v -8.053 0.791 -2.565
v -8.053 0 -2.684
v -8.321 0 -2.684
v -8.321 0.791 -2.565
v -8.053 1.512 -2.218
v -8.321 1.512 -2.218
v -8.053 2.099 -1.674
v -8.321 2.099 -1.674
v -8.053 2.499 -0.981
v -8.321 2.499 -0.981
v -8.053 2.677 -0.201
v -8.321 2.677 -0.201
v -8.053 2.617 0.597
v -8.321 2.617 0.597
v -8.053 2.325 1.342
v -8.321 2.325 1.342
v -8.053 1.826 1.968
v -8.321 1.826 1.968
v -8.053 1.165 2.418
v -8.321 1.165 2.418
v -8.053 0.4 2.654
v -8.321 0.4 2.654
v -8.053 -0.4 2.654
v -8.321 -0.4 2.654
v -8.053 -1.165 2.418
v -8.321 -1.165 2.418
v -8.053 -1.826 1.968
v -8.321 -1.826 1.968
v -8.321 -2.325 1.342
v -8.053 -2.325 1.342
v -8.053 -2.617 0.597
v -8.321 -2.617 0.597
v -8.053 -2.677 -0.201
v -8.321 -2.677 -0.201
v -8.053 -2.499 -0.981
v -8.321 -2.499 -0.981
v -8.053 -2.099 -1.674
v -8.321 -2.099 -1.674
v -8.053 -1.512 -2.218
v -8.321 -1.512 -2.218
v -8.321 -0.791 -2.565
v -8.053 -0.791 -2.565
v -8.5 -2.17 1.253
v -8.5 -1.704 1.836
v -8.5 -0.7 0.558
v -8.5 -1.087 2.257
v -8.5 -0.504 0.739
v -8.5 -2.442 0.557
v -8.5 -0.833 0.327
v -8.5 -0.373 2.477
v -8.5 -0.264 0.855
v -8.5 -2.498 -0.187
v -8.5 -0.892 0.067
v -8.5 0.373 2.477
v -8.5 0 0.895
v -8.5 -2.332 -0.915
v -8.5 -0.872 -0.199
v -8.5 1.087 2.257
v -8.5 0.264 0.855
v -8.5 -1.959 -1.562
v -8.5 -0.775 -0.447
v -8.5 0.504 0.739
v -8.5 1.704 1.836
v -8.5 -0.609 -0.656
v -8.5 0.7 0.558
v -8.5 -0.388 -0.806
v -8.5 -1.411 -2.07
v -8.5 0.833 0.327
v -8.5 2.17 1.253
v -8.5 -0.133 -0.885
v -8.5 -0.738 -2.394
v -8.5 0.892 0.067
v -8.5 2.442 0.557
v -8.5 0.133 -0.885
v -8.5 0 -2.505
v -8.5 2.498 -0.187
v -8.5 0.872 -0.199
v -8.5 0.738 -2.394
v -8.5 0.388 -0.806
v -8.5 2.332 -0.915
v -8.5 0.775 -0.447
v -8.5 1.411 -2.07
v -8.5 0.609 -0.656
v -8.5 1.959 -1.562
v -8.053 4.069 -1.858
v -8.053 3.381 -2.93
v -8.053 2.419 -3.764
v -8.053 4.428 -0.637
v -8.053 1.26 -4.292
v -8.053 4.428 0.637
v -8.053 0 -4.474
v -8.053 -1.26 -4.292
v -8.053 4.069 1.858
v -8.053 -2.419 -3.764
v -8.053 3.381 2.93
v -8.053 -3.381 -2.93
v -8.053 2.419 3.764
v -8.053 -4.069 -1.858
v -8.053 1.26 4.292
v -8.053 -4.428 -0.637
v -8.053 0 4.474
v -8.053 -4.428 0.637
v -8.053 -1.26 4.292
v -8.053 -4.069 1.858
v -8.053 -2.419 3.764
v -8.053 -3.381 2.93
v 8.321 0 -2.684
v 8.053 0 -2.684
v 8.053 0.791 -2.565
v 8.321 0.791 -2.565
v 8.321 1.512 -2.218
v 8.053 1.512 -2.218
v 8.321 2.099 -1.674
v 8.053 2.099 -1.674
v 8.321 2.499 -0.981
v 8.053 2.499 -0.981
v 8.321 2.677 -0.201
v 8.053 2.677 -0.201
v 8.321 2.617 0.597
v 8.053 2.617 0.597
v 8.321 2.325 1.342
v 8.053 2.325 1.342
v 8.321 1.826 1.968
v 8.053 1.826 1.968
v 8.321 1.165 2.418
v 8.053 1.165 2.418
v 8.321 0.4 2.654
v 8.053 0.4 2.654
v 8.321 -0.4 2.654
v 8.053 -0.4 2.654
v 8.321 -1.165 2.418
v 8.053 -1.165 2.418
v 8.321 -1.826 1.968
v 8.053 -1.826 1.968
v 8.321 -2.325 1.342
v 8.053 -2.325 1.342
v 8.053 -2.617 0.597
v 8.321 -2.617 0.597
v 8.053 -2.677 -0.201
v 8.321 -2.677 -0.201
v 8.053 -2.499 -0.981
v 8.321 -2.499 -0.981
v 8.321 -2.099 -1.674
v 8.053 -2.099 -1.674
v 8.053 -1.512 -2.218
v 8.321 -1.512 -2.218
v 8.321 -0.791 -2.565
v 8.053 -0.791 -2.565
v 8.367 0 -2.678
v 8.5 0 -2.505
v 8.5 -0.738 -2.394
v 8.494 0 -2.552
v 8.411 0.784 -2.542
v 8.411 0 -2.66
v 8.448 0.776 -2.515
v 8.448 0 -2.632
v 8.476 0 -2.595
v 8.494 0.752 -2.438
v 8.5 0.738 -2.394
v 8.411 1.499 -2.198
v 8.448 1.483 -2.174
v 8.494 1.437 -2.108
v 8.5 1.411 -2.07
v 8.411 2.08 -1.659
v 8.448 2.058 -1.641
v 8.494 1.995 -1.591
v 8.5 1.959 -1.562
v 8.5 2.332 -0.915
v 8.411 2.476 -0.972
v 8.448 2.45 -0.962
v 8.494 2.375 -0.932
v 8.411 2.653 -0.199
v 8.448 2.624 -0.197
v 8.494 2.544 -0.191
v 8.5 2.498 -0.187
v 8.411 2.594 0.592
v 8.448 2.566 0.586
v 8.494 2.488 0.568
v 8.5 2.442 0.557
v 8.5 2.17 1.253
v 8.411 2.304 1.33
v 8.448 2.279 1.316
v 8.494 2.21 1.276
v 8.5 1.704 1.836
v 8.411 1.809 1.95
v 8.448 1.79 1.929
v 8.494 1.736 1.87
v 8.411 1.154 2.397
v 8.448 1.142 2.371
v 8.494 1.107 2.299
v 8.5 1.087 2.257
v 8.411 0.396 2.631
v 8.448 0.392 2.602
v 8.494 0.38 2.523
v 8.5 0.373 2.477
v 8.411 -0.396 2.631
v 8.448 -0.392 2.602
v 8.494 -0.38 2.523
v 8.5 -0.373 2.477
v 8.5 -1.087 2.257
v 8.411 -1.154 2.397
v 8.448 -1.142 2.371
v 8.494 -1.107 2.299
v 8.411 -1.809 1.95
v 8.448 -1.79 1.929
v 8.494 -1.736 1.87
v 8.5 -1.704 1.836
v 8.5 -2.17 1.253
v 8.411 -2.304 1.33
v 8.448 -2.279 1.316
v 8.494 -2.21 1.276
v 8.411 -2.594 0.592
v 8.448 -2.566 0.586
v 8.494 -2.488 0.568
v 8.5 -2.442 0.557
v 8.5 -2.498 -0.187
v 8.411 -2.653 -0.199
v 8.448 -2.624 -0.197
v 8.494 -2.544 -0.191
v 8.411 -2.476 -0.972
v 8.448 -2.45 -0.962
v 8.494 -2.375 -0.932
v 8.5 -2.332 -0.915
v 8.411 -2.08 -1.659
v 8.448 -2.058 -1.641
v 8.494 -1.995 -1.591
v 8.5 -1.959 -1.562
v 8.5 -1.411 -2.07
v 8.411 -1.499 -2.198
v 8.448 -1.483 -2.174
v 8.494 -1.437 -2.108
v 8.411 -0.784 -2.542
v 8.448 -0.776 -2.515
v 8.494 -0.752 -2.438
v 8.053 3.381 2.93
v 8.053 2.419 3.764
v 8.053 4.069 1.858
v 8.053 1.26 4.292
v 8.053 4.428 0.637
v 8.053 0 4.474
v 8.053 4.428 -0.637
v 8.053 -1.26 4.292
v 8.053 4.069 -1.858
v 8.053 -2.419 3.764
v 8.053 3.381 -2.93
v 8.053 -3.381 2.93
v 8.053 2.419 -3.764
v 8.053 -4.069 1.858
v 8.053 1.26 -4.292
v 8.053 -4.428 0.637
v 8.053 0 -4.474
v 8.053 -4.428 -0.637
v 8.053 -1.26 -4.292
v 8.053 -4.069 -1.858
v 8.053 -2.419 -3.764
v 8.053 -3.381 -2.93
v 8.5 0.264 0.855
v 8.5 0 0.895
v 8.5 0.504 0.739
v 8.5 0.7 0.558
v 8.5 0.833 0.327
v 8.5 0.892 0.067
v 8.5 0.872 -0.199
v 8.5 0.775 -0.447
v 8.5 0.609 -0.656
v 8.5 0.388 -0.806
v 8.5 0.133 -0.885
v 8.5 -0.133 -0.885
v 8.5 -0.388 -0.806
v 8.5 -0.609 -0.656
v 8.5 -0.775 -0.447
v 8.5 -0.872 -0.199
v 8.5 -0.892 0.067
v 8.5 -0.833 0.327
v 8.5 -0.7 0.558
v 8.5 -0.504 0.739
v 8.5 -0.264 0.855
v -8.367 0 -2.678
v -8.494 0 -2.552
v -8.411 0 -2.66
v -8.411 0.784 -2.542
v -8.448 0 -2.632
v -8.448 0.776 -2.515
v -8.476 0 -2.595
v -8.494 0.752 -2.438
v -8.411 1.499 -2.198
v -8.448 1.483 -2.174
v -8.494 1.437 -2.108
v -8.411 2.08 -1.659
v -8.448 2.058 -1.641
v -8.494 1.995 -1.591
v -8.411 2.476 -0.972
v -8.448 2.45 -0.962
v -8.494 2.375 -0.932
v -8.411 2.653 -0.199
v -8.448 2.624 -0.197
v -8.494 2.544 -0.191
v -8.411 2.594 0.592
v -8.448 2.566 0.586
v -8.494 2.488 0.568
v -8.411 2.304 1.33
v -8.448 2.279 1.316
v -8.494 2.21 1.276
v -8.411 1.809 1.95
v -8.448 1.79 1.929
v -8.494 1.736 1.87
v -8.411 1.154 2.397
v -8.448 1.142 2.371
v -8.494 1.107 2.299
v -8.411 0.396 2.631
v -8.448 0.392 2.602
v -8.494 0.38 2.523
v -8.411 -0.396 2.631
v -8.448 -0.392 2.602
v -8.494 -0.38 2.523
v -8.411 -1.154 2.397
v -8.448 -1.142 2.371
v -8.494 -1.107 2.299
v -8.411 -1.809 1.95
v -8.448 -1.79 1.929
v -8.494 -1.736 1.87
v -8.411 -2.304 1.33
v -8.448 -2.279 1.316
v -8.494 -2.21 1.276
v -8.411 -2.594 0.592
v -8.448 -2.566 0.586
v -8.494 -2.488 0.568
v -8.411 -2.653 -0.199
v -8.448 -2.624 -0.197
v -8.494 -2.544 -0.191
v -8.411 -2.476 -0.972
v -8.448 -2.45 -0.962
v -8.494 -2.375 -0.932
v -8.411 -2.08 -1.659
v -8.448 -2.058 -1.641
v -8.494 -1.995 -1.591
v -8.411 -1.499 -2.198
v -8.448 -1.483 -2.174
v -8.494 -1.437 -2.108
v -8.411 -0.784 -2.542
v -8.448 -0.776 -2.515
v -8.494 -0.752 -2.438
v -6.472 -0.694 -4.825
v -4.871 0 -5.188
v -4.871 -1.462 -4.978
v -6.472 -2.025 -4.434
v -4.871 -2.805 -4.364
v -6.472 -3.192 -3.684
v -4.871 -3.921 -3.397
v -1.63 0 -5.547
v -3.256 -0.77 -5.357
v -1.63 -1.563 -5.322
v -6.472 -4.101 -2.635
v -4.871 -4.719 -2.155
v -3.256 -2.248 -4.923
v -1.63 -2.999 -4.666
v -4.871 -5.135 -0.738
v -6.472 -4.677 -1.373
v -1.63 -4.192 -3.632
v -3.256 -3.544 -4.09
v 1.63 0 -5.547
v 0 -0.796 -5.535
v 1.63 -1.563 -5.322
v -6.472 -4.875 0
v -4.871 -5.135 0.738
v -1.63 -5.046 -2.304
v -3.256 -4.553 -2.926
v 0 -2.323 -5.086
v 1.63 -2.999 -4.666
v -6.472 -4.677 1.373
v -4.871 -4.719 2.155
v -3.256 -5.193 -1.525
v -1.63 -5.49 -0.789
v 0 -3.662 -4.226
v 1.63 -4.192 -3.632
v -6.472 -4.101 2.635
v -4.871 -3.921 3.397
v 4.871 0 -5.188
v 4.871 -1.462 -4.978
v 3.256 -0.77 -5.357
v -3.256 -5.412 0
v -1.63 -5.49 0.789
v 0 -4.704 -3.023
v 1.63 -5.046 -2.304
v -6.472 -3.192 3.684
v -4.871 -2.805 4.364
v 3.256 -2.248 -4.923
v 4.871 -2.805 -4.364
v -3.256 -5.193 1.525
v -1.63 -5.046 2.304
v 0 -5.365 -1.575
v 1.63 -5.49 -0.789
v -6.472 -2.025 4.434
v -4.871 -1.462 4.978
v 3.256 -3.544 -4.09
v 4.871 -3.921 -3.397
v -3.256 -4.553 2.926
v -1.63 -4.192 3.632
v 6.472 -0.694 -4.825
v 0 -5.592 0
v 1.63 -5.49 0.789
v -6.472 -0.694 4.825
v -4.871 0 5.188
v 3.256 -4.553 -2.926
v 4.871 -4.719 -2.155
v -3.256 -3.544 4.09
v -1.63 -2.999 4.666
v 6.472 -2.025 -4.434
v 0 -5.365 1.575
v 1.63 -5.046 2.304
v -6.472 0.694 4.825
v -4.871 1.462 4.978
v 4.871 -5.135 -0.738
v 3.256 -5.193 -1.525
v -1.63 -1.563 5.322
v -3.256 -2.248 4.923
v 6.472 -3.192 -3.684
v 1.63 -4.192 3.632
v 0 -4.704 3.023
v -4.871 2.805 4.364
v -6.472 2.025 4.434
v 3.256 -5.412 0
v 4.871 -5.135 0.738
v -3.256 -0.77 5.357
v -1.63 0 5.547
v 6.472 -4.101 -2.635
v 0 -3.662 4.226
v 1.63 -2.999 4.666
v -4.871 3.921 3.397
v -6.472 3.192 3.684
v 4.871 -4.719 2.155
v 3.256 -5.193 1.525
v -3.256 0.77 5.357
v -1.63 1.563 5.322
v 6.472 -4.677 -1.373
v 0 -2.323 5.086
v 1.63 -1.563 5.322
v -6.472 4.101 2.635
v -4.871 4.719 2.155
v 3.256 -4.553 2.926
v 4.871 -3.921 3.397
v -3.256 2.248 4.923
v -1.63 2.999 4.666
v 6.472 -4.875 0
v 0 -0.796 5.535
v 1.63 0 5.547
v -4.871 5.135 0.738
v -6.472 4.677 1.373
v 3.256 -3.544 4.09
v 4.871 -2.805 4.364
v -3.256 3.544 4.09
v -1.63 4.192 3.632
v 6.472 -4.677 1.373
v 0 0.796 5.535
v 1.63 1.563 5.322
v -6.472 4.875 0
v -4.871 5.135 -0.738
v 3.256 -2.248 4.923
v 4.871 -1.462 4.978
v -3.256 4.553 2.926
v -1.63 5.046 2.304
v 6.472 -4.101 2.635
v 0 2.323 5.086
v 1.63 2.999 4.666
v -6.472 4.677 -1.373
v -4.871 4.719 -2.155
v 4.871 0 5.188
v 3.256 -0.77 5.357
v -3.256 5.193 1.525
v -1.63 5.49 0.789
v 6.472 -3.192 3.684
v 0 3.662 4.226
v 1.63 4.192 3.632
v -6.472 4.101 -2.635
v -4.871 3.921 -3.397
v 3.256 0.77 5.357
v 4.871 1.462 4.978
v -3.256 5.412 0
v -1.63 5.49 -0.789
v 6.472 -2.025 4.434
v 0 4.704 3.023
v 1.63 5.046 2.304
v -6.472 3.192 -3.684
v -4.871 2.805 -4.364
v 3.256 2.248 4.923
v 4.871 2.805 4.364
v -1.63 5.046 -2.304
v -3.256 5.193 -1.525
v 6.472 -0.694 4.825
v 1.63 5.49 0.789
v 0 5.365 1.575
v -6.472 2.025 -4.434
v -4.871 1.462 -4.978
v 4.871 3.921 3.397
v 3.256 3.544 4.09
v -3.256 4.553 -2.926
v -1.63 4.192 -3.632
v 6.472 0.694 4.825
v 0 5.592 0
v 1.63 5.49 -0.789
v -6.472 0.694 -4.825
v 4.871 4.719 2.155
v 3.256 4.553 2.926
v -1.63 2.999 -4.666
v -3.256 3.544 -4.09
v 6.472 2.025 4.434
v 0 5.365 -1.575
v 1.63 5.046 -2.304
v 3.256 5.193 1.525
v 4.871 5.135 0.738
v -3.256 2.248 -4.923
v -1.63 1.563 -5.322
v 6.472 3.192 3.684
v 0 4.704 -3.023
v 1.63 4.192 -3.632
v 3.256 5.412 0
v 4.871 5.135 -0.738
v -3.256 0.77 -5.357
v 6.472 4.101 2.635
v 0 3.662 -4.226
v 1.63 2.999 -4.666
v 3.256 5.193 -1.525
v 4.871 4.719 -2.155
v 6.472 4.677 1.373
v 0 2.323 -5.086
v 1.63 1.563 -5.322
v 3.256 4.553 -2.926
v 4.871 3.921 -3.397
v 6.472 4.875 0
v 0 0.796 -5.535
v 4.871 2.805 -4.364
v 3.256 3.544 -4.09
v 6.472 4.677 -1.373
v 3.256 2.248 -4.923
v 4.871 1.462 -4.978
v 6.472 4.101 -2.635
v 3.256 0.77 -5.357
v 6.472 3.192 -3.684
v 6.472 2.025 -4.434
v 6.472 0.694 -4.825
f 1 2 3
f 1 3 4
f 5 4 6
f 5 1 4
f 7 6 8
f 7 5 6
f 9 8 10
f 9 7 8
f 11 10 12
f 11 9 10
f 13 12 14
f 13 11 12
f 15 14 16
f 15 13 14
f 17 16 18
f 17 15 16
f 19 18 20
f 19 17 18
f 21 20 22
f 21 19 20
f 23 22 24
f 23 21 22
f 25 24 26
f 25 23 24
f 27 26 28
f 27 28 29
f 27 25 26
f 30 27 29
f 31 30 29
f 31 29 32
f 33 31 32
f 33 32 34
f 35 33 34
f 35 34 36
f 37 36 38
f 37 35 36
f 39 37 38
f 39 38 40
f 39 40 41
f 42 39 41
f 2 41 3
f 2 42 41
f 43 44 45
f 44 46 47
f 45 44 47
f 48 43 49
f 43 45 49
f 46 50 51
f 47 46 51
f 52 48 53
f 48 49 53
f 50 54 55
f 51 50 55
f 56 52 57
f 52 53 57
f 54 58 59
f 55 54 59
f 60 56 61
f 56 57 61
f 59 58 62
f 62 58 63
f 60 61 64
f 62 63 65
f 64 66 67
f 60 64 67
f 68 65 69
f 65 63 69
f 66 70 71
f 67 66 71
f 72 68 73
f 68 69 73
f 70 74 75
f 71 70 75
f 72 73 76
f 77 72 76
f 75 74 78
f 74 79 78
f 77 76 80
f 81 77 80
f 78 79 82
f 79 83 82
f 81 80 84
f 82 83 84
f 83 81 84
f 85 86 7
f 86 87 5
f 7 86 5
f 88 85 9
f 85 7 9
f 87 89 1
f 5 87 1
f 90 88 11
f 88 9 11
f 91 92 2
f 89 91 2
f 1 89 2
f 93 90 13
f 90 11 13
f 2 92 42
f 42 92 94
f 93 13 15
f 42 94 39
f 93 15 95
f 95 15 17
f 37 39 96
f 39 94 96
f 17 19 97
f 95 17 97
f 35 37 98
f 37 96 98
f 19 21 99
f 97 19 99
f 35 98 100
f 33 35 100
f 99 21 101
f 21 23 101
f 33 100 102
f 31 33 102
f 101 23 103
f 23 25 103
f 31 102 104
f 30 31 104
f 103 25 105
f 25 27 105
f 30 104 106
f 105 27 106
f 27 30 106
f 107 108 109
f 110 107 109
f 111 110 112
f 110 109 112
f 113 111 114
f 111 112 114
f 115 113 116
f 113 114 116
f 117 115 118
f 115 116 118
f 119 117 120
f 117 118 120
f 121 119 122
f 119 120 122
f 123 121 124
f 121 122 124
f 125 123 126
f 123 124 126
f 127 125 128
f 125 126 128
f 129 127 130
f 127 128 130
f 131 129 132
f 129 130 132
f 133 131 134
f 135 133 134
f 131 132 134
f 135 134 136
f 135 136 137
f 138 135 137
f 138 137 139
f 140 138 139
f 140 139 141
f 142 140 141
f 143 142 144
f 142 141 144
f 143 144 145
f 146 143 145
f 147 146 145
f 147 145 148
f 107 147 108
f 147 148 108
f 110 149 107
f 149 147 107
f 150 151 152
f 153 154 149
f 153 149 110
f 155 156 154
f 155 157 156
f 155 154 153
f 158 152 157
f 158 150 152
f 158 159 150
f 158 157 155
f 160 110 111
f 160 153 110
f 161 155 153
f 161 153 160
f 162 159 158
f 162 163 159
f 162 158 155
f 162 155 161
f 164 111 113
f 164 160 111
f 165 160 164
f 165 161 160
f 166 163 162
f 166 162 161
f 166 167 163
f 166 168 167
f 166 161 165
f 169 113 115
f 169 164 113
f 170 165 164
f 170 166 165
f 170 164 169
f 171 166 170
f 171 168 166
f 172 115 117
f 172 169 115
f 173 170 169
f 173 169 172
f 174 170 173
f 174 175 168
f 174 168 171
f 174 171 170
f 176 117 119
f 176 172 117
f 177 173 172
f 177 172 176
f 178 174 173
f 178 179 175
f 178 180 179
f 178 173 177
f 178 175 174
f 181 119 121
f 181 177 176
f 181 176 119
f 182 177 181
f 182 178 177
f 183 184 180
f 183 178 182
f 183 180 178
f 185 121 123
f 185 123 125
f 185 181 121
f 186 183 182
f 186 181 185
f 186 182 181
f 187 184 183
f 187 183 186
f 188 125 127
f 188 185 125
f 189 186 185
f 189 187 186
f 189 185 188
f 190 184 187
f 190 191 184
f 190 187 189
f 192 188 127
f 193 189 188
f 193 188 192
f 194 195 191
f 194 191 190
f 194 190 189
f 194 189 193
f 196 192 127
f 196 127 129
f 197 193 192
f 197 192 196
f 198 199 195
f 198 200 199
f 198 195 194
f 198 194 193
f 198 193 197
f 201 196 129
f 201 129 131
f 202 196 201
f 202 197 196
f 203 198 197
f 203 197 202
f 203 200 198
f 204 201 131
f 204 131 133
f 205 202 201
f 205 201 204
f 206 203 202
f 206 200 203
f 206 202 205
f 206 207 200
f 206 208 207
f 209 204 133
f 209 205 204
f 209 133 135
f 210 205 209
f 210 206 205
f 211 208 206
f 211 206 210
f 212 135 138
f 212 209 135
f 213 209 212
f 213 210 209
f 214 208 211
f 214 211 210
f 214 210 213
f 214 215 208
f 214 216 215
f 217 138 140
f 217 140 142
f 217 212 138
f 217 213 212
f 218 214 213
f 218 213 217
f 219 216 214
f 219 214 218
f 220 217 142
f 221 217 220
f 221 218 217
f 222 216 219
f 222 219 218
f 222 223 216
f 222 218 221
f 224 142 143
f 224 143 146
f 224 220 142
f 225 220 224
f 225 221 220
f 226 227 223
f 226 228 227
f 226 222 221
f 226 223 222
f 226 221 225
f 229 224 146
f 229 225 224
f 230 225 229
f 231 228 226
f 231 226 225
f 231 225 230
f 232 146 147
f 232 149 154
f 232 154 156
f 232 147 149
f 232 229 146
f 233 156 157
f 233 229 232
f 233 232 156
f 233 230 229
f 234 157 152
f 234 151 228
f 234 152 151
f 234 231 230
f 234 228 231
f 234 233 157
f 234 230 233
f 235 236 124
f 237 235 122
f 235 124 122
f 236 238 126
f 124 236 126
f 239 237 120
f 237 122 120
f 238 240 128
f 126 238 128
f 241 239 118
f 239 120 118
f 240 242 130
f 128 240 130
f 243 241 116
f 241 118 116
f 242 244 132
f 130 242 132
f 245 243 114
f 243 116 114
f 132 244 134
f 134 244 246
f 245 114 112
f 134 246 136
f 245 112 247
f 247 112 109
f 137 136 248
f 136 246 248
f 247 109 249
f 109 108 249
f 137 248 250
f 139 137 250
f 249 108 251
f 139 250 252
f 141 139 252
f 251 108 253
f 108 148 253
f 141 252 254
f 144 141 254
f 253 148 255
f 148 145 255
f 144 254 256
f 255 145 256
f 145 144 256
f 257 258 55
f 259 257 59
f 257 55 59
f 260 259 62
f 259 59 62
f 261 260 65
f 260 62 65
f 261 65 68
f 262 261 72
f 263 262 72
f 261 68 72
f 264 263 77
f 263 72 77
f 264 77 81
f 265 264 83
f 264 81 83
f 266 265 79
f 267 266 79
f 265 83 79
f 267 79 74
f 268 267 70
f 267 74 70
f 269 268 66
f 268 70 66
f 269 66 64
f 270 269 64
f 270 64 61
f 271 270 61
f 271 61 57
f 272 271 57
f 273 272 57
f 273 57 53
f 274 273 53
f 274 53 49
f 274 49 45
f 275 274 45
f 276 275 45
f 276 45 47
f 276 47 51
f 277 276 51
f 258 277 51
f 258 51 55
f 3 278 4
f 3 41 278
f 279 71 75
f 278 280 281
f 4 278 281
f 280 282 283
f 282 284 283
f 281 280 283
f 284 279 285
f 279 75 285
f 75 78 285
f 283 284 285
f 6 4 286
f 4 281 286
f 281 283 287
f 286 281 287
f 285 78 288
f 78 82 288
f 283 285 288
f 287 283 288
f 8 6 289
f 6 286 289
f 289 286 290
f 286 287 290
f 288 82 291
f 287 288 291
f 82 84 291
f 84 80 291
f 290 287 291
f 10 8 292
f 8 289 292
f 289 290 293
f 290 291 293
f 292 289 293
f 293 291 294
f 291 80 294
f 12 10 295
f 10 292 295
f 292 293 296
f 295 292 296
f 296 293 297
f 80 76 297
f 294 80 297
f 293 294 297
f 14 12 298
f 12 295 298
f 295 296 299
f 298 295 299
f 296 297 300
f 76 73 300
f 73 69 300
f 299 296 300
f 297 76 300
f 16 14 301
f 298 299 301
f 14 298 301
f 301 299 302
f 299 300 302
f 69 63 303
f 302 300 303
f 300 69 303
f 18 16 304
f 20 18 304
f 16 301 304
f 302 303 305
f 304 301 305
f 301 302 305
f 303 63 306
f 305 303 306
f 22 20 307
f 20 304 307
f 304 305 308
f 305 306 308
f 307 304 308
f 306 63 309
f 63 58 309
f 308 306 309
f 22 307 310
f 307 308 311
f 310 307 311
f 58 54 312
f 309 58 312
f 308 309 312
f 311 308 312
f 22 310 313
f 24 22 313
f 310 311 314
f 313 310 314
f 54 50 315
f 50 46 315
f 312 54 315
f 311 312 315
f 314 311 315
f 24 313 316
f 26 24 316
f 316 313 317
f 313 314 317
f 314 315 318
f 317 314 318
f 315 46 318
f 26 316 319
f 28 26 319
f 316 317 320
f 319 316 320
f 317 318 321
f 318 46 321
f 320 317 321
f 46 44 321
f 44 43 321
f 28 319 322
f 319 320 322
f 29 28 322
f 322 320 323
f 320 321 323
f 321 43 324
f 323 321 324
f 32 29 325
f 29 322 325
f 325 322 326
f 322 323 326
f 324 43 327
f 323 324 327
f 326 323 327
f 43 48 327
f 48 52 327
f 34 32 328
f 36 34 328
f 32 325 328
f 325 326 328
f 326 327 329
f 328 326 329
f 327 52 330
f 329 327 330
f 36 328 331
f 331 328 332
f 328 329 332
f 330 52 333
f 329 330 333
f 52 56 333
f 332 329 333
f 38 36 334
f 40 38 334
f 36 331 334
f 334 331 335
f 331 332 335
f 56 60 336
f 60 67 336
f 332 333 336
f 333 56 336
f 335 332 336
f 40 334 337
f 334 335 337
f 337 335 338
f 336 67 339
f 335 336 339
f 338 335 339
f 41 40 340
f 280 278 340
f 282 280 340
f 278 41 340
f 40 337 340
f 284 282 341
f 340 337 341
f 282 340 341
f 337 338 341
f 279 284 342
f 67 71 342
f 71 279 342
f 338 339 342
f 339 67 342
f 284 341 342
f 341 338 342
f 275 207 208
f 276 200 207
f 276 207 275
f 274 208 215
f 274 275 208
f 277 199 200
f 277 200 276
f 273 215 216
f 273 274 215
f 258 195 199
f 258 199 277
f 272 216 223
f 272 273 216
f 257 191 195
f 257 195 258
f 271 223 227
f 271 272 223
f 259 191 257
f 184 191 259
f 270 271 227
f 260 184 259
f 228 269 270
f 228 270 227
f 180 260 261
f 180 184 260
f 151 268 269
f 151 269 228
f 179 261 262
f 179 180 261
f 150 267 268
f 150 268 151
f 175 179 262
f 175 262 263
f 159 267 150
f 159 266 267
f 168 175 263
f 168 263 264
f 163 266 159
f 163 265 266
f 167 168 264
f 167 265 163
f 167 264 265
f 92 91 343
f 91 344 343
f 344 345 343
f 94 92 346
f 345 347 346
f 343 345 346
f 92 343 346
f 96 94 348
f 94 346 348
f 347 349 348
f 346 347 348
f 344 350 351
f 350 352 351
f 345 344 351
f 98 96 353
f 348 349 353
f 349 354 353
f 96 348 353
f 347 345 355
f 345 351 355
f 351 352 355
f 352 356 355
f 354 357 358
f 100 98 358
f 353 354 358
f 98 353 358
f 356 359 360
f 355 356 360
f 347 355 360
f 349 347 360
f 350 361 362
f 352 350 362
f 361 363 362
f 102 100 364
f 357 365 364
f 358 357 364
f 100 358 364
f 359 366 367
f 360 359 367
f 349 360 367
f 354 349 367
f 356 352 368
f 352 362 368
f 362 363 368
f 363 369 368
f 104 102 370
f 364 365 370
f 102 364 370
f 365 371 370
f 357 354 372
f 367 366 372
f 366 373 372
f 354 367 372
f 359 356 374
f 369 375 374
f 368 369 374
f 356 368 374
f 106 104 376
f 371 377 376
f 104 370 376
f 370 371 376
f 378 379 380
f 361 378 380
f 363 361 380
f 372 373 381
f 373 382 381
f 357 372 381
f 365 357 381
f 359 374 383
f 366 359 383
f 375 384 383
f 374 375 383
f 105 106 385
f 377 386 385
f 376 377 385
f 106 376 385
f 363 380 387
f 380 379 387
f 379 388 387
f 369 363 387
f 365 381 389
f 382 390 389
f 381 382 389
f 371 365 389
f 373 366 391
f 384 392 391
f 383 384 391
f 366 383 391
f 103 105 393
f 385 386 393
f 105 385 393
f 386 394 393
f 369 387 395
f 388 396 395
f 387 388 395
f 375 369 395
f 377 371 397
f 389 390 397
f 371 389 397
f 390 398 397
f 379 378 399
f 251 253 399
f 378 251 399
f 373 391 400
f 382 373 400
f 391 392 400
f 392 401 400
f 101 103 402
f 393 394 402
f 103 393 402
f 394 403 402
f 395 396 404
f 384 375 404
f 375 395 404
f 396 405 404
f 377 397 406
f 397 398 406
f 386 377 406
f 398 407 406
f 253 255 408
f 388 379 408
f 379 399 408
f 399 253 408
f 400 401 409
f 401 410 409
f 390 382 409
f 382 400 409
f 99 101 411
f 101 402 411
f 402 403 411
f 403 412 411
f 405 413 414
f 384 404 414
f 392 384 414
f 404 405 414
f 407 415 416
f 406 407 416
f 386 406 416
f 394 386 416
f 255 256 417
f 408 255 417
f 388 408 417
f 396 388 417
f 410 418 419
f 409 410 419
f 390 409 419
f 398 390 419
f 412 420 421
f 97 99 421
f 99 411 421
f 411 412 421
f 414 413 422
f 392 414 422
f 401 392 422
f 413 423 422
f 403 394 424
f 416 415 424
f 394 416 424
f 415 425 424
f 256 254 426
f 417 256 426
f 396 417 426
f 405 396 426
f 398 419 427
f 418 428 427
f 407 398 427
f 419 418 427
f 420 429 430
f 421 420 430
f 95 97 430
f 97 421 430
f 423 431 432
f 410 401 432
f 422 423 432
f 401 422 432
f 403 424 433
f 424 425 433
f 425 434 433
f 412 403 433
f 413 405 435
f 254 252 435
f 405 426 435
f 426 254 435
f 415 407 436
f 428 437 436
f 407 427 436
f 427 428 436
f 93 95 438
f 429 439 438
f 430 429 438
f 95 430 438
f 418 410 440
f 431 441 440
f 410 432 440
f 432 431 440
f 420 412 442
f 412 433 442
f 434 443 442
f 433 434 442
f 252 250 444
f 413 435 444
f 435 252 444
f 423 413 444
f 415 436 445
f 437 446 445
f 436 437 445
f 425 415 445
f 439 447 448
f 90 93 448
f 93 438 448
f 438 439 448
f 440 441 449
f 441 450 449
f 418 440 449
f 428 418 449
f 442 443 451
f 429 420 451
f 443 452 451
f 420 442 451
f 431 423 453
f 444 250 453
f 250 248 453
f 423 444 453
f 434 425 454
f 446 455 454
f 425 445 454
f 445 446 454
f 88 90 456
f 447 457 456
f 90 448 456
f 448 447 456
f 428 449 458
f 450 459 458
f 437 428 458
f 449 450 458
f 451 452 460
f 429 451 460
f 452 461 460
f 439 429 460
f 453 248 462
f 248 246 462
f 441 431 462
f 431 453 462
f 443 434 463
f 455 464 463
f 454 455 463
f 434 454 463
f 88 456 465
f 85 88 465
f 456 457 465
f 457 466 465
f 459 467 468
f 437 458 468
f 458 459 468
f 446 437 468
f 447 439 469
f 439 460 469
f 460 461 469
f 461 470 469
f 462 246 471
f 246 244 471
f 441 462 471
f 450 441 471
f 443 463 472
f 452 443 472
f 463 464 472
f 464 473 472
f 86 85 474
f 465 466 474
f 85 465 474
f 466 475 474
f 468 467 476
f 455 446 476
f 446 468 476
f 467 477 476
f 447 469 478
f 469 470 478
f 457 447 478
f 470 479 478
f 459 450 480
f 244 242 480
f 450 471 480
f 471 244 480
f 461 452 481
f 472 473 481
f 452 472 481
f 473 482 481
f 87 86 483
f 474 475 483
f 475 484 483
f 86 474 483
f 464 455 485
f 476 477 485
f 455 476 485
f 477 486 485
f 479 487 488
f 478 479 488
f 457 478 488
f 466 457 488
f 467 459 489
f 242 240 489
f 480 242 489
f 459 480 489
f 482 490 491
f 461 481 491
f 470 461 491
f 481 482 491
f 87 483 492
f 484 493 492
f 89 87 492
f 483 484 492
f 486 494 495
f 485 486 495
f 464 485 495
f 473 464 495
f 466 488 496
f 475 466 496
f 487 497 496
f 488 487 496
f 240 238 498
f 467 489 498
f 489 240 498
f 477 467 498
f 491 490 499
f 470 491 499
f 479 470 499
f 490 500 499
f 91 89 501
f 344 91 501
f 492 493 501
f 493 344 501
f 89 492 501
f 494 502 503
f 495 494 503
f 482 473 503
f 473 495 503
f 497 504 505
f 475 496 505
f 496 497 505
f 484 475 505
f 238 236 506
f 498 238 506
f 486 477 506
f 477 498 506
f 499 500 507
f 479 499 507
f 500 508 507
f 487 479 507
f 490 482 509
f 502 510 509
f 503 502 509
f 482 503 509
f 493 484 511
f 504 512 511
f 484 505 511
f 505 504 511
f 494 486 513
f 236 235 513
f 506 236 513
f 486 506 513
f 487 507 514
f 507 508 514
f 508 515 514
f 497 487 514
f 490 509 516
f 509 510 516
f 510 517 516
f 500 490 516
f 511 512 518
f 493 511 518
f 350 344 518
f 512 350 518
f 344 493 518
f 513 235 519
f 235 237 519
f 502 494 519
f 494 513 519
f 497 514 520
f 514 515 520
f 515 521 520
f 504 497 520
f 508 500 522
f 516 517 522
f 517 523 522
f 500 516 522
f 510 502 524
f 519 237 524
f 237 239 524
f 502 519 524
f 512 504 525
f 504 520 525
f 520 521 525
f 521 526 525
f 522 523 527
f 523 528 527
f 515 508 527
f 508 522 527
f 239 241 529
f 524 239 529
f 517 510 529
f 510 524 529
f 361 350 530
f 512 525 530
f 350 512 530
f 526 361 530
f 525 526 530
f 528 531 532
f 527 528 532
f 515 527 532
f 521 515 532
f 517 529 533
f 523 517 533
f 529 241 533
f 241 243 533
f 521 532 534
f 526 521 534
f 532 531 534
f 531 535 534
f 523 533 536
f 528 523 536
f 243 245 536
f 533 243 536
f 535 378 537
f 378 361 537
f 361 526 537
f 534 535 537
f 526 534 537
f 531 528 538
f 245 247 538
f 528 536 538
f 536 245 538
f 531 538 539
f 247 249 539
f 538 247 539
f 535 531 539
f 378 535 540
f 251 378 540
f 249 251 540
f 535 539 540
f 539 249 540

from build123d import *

# Parameters (mm, degrees)
SKETCH3_R           = 3
BOSS_EXTRUDE1_DEPTH = 0.5
SKETCH4_R           = 1
CUT_EXTRUDE2_DEPTH  = 20
FILLET1_R           = 0.2
SCALE_1_SCALE       = 0.894736842


with BuildPart() as part:
    # Sketch1 → Revolve1 (revolve)
    with BuildSketch(Plane(origin=(0, 0, 0), x_dir=(1, 0, 0), z_dir=(0, 1, 0))):
        with BuildLine():
            Line((0, 0), (-9, 0))
            Line((-9, 0), (-9, 5))
            ThreePointArc((-9, 5), (0, 6.249672879), (9, 5))
            Line((9, 5), (9, 0))
            Line((9, 0), (0, 0))
        make_face()
    revolve(axis=Axis((0, 0, 0), (-1, 0, 0)))

    # Sketch3 → Boss-Extrude1 (add)
    with BuildSketch(Plane(origin=(9, 0, 0), x_dir=(0, 0, -1), z_dir=(1, 0, 0))):
        Circle(SKETCH3_R)
    boss_extrude1 = extrude(amount=BOSS_EXTRUDE1_DEPTH)

    # Mirror1: Boss-Extrude1 across plane
    add(boss_extrude1.mirror(Plane(origin=(0, 0, 0), x_dir=(0, 0, 1), z_dir=(1, 0, 0))))

    # Sketch4 → Cut-Extrude2 (cut, through all)
    with BuildSketch(Plane.ZY.offset(9.5)):
        Circle(SKETCH4_R)
    extrude(amount=-CUT_EXTRUDE2_DEPTH, mode=Mode.SUBTRACT)

    # Fillet1
    fillet1_edges = [part.edges().sort_by_distance(p)[0] for p in [
        (9.5, 0, 3),
        (-9.5, 0, 3),
    ]]
    fillet(fillet1_edges, radius=FILLET1_R)


with BuildPart() as part_1:
    # ｽｹｰﾙ1: scaled about (0, 0, 0)
    add(part.part.scale(SCALE_1_SCALE))


solid = part_1.part
